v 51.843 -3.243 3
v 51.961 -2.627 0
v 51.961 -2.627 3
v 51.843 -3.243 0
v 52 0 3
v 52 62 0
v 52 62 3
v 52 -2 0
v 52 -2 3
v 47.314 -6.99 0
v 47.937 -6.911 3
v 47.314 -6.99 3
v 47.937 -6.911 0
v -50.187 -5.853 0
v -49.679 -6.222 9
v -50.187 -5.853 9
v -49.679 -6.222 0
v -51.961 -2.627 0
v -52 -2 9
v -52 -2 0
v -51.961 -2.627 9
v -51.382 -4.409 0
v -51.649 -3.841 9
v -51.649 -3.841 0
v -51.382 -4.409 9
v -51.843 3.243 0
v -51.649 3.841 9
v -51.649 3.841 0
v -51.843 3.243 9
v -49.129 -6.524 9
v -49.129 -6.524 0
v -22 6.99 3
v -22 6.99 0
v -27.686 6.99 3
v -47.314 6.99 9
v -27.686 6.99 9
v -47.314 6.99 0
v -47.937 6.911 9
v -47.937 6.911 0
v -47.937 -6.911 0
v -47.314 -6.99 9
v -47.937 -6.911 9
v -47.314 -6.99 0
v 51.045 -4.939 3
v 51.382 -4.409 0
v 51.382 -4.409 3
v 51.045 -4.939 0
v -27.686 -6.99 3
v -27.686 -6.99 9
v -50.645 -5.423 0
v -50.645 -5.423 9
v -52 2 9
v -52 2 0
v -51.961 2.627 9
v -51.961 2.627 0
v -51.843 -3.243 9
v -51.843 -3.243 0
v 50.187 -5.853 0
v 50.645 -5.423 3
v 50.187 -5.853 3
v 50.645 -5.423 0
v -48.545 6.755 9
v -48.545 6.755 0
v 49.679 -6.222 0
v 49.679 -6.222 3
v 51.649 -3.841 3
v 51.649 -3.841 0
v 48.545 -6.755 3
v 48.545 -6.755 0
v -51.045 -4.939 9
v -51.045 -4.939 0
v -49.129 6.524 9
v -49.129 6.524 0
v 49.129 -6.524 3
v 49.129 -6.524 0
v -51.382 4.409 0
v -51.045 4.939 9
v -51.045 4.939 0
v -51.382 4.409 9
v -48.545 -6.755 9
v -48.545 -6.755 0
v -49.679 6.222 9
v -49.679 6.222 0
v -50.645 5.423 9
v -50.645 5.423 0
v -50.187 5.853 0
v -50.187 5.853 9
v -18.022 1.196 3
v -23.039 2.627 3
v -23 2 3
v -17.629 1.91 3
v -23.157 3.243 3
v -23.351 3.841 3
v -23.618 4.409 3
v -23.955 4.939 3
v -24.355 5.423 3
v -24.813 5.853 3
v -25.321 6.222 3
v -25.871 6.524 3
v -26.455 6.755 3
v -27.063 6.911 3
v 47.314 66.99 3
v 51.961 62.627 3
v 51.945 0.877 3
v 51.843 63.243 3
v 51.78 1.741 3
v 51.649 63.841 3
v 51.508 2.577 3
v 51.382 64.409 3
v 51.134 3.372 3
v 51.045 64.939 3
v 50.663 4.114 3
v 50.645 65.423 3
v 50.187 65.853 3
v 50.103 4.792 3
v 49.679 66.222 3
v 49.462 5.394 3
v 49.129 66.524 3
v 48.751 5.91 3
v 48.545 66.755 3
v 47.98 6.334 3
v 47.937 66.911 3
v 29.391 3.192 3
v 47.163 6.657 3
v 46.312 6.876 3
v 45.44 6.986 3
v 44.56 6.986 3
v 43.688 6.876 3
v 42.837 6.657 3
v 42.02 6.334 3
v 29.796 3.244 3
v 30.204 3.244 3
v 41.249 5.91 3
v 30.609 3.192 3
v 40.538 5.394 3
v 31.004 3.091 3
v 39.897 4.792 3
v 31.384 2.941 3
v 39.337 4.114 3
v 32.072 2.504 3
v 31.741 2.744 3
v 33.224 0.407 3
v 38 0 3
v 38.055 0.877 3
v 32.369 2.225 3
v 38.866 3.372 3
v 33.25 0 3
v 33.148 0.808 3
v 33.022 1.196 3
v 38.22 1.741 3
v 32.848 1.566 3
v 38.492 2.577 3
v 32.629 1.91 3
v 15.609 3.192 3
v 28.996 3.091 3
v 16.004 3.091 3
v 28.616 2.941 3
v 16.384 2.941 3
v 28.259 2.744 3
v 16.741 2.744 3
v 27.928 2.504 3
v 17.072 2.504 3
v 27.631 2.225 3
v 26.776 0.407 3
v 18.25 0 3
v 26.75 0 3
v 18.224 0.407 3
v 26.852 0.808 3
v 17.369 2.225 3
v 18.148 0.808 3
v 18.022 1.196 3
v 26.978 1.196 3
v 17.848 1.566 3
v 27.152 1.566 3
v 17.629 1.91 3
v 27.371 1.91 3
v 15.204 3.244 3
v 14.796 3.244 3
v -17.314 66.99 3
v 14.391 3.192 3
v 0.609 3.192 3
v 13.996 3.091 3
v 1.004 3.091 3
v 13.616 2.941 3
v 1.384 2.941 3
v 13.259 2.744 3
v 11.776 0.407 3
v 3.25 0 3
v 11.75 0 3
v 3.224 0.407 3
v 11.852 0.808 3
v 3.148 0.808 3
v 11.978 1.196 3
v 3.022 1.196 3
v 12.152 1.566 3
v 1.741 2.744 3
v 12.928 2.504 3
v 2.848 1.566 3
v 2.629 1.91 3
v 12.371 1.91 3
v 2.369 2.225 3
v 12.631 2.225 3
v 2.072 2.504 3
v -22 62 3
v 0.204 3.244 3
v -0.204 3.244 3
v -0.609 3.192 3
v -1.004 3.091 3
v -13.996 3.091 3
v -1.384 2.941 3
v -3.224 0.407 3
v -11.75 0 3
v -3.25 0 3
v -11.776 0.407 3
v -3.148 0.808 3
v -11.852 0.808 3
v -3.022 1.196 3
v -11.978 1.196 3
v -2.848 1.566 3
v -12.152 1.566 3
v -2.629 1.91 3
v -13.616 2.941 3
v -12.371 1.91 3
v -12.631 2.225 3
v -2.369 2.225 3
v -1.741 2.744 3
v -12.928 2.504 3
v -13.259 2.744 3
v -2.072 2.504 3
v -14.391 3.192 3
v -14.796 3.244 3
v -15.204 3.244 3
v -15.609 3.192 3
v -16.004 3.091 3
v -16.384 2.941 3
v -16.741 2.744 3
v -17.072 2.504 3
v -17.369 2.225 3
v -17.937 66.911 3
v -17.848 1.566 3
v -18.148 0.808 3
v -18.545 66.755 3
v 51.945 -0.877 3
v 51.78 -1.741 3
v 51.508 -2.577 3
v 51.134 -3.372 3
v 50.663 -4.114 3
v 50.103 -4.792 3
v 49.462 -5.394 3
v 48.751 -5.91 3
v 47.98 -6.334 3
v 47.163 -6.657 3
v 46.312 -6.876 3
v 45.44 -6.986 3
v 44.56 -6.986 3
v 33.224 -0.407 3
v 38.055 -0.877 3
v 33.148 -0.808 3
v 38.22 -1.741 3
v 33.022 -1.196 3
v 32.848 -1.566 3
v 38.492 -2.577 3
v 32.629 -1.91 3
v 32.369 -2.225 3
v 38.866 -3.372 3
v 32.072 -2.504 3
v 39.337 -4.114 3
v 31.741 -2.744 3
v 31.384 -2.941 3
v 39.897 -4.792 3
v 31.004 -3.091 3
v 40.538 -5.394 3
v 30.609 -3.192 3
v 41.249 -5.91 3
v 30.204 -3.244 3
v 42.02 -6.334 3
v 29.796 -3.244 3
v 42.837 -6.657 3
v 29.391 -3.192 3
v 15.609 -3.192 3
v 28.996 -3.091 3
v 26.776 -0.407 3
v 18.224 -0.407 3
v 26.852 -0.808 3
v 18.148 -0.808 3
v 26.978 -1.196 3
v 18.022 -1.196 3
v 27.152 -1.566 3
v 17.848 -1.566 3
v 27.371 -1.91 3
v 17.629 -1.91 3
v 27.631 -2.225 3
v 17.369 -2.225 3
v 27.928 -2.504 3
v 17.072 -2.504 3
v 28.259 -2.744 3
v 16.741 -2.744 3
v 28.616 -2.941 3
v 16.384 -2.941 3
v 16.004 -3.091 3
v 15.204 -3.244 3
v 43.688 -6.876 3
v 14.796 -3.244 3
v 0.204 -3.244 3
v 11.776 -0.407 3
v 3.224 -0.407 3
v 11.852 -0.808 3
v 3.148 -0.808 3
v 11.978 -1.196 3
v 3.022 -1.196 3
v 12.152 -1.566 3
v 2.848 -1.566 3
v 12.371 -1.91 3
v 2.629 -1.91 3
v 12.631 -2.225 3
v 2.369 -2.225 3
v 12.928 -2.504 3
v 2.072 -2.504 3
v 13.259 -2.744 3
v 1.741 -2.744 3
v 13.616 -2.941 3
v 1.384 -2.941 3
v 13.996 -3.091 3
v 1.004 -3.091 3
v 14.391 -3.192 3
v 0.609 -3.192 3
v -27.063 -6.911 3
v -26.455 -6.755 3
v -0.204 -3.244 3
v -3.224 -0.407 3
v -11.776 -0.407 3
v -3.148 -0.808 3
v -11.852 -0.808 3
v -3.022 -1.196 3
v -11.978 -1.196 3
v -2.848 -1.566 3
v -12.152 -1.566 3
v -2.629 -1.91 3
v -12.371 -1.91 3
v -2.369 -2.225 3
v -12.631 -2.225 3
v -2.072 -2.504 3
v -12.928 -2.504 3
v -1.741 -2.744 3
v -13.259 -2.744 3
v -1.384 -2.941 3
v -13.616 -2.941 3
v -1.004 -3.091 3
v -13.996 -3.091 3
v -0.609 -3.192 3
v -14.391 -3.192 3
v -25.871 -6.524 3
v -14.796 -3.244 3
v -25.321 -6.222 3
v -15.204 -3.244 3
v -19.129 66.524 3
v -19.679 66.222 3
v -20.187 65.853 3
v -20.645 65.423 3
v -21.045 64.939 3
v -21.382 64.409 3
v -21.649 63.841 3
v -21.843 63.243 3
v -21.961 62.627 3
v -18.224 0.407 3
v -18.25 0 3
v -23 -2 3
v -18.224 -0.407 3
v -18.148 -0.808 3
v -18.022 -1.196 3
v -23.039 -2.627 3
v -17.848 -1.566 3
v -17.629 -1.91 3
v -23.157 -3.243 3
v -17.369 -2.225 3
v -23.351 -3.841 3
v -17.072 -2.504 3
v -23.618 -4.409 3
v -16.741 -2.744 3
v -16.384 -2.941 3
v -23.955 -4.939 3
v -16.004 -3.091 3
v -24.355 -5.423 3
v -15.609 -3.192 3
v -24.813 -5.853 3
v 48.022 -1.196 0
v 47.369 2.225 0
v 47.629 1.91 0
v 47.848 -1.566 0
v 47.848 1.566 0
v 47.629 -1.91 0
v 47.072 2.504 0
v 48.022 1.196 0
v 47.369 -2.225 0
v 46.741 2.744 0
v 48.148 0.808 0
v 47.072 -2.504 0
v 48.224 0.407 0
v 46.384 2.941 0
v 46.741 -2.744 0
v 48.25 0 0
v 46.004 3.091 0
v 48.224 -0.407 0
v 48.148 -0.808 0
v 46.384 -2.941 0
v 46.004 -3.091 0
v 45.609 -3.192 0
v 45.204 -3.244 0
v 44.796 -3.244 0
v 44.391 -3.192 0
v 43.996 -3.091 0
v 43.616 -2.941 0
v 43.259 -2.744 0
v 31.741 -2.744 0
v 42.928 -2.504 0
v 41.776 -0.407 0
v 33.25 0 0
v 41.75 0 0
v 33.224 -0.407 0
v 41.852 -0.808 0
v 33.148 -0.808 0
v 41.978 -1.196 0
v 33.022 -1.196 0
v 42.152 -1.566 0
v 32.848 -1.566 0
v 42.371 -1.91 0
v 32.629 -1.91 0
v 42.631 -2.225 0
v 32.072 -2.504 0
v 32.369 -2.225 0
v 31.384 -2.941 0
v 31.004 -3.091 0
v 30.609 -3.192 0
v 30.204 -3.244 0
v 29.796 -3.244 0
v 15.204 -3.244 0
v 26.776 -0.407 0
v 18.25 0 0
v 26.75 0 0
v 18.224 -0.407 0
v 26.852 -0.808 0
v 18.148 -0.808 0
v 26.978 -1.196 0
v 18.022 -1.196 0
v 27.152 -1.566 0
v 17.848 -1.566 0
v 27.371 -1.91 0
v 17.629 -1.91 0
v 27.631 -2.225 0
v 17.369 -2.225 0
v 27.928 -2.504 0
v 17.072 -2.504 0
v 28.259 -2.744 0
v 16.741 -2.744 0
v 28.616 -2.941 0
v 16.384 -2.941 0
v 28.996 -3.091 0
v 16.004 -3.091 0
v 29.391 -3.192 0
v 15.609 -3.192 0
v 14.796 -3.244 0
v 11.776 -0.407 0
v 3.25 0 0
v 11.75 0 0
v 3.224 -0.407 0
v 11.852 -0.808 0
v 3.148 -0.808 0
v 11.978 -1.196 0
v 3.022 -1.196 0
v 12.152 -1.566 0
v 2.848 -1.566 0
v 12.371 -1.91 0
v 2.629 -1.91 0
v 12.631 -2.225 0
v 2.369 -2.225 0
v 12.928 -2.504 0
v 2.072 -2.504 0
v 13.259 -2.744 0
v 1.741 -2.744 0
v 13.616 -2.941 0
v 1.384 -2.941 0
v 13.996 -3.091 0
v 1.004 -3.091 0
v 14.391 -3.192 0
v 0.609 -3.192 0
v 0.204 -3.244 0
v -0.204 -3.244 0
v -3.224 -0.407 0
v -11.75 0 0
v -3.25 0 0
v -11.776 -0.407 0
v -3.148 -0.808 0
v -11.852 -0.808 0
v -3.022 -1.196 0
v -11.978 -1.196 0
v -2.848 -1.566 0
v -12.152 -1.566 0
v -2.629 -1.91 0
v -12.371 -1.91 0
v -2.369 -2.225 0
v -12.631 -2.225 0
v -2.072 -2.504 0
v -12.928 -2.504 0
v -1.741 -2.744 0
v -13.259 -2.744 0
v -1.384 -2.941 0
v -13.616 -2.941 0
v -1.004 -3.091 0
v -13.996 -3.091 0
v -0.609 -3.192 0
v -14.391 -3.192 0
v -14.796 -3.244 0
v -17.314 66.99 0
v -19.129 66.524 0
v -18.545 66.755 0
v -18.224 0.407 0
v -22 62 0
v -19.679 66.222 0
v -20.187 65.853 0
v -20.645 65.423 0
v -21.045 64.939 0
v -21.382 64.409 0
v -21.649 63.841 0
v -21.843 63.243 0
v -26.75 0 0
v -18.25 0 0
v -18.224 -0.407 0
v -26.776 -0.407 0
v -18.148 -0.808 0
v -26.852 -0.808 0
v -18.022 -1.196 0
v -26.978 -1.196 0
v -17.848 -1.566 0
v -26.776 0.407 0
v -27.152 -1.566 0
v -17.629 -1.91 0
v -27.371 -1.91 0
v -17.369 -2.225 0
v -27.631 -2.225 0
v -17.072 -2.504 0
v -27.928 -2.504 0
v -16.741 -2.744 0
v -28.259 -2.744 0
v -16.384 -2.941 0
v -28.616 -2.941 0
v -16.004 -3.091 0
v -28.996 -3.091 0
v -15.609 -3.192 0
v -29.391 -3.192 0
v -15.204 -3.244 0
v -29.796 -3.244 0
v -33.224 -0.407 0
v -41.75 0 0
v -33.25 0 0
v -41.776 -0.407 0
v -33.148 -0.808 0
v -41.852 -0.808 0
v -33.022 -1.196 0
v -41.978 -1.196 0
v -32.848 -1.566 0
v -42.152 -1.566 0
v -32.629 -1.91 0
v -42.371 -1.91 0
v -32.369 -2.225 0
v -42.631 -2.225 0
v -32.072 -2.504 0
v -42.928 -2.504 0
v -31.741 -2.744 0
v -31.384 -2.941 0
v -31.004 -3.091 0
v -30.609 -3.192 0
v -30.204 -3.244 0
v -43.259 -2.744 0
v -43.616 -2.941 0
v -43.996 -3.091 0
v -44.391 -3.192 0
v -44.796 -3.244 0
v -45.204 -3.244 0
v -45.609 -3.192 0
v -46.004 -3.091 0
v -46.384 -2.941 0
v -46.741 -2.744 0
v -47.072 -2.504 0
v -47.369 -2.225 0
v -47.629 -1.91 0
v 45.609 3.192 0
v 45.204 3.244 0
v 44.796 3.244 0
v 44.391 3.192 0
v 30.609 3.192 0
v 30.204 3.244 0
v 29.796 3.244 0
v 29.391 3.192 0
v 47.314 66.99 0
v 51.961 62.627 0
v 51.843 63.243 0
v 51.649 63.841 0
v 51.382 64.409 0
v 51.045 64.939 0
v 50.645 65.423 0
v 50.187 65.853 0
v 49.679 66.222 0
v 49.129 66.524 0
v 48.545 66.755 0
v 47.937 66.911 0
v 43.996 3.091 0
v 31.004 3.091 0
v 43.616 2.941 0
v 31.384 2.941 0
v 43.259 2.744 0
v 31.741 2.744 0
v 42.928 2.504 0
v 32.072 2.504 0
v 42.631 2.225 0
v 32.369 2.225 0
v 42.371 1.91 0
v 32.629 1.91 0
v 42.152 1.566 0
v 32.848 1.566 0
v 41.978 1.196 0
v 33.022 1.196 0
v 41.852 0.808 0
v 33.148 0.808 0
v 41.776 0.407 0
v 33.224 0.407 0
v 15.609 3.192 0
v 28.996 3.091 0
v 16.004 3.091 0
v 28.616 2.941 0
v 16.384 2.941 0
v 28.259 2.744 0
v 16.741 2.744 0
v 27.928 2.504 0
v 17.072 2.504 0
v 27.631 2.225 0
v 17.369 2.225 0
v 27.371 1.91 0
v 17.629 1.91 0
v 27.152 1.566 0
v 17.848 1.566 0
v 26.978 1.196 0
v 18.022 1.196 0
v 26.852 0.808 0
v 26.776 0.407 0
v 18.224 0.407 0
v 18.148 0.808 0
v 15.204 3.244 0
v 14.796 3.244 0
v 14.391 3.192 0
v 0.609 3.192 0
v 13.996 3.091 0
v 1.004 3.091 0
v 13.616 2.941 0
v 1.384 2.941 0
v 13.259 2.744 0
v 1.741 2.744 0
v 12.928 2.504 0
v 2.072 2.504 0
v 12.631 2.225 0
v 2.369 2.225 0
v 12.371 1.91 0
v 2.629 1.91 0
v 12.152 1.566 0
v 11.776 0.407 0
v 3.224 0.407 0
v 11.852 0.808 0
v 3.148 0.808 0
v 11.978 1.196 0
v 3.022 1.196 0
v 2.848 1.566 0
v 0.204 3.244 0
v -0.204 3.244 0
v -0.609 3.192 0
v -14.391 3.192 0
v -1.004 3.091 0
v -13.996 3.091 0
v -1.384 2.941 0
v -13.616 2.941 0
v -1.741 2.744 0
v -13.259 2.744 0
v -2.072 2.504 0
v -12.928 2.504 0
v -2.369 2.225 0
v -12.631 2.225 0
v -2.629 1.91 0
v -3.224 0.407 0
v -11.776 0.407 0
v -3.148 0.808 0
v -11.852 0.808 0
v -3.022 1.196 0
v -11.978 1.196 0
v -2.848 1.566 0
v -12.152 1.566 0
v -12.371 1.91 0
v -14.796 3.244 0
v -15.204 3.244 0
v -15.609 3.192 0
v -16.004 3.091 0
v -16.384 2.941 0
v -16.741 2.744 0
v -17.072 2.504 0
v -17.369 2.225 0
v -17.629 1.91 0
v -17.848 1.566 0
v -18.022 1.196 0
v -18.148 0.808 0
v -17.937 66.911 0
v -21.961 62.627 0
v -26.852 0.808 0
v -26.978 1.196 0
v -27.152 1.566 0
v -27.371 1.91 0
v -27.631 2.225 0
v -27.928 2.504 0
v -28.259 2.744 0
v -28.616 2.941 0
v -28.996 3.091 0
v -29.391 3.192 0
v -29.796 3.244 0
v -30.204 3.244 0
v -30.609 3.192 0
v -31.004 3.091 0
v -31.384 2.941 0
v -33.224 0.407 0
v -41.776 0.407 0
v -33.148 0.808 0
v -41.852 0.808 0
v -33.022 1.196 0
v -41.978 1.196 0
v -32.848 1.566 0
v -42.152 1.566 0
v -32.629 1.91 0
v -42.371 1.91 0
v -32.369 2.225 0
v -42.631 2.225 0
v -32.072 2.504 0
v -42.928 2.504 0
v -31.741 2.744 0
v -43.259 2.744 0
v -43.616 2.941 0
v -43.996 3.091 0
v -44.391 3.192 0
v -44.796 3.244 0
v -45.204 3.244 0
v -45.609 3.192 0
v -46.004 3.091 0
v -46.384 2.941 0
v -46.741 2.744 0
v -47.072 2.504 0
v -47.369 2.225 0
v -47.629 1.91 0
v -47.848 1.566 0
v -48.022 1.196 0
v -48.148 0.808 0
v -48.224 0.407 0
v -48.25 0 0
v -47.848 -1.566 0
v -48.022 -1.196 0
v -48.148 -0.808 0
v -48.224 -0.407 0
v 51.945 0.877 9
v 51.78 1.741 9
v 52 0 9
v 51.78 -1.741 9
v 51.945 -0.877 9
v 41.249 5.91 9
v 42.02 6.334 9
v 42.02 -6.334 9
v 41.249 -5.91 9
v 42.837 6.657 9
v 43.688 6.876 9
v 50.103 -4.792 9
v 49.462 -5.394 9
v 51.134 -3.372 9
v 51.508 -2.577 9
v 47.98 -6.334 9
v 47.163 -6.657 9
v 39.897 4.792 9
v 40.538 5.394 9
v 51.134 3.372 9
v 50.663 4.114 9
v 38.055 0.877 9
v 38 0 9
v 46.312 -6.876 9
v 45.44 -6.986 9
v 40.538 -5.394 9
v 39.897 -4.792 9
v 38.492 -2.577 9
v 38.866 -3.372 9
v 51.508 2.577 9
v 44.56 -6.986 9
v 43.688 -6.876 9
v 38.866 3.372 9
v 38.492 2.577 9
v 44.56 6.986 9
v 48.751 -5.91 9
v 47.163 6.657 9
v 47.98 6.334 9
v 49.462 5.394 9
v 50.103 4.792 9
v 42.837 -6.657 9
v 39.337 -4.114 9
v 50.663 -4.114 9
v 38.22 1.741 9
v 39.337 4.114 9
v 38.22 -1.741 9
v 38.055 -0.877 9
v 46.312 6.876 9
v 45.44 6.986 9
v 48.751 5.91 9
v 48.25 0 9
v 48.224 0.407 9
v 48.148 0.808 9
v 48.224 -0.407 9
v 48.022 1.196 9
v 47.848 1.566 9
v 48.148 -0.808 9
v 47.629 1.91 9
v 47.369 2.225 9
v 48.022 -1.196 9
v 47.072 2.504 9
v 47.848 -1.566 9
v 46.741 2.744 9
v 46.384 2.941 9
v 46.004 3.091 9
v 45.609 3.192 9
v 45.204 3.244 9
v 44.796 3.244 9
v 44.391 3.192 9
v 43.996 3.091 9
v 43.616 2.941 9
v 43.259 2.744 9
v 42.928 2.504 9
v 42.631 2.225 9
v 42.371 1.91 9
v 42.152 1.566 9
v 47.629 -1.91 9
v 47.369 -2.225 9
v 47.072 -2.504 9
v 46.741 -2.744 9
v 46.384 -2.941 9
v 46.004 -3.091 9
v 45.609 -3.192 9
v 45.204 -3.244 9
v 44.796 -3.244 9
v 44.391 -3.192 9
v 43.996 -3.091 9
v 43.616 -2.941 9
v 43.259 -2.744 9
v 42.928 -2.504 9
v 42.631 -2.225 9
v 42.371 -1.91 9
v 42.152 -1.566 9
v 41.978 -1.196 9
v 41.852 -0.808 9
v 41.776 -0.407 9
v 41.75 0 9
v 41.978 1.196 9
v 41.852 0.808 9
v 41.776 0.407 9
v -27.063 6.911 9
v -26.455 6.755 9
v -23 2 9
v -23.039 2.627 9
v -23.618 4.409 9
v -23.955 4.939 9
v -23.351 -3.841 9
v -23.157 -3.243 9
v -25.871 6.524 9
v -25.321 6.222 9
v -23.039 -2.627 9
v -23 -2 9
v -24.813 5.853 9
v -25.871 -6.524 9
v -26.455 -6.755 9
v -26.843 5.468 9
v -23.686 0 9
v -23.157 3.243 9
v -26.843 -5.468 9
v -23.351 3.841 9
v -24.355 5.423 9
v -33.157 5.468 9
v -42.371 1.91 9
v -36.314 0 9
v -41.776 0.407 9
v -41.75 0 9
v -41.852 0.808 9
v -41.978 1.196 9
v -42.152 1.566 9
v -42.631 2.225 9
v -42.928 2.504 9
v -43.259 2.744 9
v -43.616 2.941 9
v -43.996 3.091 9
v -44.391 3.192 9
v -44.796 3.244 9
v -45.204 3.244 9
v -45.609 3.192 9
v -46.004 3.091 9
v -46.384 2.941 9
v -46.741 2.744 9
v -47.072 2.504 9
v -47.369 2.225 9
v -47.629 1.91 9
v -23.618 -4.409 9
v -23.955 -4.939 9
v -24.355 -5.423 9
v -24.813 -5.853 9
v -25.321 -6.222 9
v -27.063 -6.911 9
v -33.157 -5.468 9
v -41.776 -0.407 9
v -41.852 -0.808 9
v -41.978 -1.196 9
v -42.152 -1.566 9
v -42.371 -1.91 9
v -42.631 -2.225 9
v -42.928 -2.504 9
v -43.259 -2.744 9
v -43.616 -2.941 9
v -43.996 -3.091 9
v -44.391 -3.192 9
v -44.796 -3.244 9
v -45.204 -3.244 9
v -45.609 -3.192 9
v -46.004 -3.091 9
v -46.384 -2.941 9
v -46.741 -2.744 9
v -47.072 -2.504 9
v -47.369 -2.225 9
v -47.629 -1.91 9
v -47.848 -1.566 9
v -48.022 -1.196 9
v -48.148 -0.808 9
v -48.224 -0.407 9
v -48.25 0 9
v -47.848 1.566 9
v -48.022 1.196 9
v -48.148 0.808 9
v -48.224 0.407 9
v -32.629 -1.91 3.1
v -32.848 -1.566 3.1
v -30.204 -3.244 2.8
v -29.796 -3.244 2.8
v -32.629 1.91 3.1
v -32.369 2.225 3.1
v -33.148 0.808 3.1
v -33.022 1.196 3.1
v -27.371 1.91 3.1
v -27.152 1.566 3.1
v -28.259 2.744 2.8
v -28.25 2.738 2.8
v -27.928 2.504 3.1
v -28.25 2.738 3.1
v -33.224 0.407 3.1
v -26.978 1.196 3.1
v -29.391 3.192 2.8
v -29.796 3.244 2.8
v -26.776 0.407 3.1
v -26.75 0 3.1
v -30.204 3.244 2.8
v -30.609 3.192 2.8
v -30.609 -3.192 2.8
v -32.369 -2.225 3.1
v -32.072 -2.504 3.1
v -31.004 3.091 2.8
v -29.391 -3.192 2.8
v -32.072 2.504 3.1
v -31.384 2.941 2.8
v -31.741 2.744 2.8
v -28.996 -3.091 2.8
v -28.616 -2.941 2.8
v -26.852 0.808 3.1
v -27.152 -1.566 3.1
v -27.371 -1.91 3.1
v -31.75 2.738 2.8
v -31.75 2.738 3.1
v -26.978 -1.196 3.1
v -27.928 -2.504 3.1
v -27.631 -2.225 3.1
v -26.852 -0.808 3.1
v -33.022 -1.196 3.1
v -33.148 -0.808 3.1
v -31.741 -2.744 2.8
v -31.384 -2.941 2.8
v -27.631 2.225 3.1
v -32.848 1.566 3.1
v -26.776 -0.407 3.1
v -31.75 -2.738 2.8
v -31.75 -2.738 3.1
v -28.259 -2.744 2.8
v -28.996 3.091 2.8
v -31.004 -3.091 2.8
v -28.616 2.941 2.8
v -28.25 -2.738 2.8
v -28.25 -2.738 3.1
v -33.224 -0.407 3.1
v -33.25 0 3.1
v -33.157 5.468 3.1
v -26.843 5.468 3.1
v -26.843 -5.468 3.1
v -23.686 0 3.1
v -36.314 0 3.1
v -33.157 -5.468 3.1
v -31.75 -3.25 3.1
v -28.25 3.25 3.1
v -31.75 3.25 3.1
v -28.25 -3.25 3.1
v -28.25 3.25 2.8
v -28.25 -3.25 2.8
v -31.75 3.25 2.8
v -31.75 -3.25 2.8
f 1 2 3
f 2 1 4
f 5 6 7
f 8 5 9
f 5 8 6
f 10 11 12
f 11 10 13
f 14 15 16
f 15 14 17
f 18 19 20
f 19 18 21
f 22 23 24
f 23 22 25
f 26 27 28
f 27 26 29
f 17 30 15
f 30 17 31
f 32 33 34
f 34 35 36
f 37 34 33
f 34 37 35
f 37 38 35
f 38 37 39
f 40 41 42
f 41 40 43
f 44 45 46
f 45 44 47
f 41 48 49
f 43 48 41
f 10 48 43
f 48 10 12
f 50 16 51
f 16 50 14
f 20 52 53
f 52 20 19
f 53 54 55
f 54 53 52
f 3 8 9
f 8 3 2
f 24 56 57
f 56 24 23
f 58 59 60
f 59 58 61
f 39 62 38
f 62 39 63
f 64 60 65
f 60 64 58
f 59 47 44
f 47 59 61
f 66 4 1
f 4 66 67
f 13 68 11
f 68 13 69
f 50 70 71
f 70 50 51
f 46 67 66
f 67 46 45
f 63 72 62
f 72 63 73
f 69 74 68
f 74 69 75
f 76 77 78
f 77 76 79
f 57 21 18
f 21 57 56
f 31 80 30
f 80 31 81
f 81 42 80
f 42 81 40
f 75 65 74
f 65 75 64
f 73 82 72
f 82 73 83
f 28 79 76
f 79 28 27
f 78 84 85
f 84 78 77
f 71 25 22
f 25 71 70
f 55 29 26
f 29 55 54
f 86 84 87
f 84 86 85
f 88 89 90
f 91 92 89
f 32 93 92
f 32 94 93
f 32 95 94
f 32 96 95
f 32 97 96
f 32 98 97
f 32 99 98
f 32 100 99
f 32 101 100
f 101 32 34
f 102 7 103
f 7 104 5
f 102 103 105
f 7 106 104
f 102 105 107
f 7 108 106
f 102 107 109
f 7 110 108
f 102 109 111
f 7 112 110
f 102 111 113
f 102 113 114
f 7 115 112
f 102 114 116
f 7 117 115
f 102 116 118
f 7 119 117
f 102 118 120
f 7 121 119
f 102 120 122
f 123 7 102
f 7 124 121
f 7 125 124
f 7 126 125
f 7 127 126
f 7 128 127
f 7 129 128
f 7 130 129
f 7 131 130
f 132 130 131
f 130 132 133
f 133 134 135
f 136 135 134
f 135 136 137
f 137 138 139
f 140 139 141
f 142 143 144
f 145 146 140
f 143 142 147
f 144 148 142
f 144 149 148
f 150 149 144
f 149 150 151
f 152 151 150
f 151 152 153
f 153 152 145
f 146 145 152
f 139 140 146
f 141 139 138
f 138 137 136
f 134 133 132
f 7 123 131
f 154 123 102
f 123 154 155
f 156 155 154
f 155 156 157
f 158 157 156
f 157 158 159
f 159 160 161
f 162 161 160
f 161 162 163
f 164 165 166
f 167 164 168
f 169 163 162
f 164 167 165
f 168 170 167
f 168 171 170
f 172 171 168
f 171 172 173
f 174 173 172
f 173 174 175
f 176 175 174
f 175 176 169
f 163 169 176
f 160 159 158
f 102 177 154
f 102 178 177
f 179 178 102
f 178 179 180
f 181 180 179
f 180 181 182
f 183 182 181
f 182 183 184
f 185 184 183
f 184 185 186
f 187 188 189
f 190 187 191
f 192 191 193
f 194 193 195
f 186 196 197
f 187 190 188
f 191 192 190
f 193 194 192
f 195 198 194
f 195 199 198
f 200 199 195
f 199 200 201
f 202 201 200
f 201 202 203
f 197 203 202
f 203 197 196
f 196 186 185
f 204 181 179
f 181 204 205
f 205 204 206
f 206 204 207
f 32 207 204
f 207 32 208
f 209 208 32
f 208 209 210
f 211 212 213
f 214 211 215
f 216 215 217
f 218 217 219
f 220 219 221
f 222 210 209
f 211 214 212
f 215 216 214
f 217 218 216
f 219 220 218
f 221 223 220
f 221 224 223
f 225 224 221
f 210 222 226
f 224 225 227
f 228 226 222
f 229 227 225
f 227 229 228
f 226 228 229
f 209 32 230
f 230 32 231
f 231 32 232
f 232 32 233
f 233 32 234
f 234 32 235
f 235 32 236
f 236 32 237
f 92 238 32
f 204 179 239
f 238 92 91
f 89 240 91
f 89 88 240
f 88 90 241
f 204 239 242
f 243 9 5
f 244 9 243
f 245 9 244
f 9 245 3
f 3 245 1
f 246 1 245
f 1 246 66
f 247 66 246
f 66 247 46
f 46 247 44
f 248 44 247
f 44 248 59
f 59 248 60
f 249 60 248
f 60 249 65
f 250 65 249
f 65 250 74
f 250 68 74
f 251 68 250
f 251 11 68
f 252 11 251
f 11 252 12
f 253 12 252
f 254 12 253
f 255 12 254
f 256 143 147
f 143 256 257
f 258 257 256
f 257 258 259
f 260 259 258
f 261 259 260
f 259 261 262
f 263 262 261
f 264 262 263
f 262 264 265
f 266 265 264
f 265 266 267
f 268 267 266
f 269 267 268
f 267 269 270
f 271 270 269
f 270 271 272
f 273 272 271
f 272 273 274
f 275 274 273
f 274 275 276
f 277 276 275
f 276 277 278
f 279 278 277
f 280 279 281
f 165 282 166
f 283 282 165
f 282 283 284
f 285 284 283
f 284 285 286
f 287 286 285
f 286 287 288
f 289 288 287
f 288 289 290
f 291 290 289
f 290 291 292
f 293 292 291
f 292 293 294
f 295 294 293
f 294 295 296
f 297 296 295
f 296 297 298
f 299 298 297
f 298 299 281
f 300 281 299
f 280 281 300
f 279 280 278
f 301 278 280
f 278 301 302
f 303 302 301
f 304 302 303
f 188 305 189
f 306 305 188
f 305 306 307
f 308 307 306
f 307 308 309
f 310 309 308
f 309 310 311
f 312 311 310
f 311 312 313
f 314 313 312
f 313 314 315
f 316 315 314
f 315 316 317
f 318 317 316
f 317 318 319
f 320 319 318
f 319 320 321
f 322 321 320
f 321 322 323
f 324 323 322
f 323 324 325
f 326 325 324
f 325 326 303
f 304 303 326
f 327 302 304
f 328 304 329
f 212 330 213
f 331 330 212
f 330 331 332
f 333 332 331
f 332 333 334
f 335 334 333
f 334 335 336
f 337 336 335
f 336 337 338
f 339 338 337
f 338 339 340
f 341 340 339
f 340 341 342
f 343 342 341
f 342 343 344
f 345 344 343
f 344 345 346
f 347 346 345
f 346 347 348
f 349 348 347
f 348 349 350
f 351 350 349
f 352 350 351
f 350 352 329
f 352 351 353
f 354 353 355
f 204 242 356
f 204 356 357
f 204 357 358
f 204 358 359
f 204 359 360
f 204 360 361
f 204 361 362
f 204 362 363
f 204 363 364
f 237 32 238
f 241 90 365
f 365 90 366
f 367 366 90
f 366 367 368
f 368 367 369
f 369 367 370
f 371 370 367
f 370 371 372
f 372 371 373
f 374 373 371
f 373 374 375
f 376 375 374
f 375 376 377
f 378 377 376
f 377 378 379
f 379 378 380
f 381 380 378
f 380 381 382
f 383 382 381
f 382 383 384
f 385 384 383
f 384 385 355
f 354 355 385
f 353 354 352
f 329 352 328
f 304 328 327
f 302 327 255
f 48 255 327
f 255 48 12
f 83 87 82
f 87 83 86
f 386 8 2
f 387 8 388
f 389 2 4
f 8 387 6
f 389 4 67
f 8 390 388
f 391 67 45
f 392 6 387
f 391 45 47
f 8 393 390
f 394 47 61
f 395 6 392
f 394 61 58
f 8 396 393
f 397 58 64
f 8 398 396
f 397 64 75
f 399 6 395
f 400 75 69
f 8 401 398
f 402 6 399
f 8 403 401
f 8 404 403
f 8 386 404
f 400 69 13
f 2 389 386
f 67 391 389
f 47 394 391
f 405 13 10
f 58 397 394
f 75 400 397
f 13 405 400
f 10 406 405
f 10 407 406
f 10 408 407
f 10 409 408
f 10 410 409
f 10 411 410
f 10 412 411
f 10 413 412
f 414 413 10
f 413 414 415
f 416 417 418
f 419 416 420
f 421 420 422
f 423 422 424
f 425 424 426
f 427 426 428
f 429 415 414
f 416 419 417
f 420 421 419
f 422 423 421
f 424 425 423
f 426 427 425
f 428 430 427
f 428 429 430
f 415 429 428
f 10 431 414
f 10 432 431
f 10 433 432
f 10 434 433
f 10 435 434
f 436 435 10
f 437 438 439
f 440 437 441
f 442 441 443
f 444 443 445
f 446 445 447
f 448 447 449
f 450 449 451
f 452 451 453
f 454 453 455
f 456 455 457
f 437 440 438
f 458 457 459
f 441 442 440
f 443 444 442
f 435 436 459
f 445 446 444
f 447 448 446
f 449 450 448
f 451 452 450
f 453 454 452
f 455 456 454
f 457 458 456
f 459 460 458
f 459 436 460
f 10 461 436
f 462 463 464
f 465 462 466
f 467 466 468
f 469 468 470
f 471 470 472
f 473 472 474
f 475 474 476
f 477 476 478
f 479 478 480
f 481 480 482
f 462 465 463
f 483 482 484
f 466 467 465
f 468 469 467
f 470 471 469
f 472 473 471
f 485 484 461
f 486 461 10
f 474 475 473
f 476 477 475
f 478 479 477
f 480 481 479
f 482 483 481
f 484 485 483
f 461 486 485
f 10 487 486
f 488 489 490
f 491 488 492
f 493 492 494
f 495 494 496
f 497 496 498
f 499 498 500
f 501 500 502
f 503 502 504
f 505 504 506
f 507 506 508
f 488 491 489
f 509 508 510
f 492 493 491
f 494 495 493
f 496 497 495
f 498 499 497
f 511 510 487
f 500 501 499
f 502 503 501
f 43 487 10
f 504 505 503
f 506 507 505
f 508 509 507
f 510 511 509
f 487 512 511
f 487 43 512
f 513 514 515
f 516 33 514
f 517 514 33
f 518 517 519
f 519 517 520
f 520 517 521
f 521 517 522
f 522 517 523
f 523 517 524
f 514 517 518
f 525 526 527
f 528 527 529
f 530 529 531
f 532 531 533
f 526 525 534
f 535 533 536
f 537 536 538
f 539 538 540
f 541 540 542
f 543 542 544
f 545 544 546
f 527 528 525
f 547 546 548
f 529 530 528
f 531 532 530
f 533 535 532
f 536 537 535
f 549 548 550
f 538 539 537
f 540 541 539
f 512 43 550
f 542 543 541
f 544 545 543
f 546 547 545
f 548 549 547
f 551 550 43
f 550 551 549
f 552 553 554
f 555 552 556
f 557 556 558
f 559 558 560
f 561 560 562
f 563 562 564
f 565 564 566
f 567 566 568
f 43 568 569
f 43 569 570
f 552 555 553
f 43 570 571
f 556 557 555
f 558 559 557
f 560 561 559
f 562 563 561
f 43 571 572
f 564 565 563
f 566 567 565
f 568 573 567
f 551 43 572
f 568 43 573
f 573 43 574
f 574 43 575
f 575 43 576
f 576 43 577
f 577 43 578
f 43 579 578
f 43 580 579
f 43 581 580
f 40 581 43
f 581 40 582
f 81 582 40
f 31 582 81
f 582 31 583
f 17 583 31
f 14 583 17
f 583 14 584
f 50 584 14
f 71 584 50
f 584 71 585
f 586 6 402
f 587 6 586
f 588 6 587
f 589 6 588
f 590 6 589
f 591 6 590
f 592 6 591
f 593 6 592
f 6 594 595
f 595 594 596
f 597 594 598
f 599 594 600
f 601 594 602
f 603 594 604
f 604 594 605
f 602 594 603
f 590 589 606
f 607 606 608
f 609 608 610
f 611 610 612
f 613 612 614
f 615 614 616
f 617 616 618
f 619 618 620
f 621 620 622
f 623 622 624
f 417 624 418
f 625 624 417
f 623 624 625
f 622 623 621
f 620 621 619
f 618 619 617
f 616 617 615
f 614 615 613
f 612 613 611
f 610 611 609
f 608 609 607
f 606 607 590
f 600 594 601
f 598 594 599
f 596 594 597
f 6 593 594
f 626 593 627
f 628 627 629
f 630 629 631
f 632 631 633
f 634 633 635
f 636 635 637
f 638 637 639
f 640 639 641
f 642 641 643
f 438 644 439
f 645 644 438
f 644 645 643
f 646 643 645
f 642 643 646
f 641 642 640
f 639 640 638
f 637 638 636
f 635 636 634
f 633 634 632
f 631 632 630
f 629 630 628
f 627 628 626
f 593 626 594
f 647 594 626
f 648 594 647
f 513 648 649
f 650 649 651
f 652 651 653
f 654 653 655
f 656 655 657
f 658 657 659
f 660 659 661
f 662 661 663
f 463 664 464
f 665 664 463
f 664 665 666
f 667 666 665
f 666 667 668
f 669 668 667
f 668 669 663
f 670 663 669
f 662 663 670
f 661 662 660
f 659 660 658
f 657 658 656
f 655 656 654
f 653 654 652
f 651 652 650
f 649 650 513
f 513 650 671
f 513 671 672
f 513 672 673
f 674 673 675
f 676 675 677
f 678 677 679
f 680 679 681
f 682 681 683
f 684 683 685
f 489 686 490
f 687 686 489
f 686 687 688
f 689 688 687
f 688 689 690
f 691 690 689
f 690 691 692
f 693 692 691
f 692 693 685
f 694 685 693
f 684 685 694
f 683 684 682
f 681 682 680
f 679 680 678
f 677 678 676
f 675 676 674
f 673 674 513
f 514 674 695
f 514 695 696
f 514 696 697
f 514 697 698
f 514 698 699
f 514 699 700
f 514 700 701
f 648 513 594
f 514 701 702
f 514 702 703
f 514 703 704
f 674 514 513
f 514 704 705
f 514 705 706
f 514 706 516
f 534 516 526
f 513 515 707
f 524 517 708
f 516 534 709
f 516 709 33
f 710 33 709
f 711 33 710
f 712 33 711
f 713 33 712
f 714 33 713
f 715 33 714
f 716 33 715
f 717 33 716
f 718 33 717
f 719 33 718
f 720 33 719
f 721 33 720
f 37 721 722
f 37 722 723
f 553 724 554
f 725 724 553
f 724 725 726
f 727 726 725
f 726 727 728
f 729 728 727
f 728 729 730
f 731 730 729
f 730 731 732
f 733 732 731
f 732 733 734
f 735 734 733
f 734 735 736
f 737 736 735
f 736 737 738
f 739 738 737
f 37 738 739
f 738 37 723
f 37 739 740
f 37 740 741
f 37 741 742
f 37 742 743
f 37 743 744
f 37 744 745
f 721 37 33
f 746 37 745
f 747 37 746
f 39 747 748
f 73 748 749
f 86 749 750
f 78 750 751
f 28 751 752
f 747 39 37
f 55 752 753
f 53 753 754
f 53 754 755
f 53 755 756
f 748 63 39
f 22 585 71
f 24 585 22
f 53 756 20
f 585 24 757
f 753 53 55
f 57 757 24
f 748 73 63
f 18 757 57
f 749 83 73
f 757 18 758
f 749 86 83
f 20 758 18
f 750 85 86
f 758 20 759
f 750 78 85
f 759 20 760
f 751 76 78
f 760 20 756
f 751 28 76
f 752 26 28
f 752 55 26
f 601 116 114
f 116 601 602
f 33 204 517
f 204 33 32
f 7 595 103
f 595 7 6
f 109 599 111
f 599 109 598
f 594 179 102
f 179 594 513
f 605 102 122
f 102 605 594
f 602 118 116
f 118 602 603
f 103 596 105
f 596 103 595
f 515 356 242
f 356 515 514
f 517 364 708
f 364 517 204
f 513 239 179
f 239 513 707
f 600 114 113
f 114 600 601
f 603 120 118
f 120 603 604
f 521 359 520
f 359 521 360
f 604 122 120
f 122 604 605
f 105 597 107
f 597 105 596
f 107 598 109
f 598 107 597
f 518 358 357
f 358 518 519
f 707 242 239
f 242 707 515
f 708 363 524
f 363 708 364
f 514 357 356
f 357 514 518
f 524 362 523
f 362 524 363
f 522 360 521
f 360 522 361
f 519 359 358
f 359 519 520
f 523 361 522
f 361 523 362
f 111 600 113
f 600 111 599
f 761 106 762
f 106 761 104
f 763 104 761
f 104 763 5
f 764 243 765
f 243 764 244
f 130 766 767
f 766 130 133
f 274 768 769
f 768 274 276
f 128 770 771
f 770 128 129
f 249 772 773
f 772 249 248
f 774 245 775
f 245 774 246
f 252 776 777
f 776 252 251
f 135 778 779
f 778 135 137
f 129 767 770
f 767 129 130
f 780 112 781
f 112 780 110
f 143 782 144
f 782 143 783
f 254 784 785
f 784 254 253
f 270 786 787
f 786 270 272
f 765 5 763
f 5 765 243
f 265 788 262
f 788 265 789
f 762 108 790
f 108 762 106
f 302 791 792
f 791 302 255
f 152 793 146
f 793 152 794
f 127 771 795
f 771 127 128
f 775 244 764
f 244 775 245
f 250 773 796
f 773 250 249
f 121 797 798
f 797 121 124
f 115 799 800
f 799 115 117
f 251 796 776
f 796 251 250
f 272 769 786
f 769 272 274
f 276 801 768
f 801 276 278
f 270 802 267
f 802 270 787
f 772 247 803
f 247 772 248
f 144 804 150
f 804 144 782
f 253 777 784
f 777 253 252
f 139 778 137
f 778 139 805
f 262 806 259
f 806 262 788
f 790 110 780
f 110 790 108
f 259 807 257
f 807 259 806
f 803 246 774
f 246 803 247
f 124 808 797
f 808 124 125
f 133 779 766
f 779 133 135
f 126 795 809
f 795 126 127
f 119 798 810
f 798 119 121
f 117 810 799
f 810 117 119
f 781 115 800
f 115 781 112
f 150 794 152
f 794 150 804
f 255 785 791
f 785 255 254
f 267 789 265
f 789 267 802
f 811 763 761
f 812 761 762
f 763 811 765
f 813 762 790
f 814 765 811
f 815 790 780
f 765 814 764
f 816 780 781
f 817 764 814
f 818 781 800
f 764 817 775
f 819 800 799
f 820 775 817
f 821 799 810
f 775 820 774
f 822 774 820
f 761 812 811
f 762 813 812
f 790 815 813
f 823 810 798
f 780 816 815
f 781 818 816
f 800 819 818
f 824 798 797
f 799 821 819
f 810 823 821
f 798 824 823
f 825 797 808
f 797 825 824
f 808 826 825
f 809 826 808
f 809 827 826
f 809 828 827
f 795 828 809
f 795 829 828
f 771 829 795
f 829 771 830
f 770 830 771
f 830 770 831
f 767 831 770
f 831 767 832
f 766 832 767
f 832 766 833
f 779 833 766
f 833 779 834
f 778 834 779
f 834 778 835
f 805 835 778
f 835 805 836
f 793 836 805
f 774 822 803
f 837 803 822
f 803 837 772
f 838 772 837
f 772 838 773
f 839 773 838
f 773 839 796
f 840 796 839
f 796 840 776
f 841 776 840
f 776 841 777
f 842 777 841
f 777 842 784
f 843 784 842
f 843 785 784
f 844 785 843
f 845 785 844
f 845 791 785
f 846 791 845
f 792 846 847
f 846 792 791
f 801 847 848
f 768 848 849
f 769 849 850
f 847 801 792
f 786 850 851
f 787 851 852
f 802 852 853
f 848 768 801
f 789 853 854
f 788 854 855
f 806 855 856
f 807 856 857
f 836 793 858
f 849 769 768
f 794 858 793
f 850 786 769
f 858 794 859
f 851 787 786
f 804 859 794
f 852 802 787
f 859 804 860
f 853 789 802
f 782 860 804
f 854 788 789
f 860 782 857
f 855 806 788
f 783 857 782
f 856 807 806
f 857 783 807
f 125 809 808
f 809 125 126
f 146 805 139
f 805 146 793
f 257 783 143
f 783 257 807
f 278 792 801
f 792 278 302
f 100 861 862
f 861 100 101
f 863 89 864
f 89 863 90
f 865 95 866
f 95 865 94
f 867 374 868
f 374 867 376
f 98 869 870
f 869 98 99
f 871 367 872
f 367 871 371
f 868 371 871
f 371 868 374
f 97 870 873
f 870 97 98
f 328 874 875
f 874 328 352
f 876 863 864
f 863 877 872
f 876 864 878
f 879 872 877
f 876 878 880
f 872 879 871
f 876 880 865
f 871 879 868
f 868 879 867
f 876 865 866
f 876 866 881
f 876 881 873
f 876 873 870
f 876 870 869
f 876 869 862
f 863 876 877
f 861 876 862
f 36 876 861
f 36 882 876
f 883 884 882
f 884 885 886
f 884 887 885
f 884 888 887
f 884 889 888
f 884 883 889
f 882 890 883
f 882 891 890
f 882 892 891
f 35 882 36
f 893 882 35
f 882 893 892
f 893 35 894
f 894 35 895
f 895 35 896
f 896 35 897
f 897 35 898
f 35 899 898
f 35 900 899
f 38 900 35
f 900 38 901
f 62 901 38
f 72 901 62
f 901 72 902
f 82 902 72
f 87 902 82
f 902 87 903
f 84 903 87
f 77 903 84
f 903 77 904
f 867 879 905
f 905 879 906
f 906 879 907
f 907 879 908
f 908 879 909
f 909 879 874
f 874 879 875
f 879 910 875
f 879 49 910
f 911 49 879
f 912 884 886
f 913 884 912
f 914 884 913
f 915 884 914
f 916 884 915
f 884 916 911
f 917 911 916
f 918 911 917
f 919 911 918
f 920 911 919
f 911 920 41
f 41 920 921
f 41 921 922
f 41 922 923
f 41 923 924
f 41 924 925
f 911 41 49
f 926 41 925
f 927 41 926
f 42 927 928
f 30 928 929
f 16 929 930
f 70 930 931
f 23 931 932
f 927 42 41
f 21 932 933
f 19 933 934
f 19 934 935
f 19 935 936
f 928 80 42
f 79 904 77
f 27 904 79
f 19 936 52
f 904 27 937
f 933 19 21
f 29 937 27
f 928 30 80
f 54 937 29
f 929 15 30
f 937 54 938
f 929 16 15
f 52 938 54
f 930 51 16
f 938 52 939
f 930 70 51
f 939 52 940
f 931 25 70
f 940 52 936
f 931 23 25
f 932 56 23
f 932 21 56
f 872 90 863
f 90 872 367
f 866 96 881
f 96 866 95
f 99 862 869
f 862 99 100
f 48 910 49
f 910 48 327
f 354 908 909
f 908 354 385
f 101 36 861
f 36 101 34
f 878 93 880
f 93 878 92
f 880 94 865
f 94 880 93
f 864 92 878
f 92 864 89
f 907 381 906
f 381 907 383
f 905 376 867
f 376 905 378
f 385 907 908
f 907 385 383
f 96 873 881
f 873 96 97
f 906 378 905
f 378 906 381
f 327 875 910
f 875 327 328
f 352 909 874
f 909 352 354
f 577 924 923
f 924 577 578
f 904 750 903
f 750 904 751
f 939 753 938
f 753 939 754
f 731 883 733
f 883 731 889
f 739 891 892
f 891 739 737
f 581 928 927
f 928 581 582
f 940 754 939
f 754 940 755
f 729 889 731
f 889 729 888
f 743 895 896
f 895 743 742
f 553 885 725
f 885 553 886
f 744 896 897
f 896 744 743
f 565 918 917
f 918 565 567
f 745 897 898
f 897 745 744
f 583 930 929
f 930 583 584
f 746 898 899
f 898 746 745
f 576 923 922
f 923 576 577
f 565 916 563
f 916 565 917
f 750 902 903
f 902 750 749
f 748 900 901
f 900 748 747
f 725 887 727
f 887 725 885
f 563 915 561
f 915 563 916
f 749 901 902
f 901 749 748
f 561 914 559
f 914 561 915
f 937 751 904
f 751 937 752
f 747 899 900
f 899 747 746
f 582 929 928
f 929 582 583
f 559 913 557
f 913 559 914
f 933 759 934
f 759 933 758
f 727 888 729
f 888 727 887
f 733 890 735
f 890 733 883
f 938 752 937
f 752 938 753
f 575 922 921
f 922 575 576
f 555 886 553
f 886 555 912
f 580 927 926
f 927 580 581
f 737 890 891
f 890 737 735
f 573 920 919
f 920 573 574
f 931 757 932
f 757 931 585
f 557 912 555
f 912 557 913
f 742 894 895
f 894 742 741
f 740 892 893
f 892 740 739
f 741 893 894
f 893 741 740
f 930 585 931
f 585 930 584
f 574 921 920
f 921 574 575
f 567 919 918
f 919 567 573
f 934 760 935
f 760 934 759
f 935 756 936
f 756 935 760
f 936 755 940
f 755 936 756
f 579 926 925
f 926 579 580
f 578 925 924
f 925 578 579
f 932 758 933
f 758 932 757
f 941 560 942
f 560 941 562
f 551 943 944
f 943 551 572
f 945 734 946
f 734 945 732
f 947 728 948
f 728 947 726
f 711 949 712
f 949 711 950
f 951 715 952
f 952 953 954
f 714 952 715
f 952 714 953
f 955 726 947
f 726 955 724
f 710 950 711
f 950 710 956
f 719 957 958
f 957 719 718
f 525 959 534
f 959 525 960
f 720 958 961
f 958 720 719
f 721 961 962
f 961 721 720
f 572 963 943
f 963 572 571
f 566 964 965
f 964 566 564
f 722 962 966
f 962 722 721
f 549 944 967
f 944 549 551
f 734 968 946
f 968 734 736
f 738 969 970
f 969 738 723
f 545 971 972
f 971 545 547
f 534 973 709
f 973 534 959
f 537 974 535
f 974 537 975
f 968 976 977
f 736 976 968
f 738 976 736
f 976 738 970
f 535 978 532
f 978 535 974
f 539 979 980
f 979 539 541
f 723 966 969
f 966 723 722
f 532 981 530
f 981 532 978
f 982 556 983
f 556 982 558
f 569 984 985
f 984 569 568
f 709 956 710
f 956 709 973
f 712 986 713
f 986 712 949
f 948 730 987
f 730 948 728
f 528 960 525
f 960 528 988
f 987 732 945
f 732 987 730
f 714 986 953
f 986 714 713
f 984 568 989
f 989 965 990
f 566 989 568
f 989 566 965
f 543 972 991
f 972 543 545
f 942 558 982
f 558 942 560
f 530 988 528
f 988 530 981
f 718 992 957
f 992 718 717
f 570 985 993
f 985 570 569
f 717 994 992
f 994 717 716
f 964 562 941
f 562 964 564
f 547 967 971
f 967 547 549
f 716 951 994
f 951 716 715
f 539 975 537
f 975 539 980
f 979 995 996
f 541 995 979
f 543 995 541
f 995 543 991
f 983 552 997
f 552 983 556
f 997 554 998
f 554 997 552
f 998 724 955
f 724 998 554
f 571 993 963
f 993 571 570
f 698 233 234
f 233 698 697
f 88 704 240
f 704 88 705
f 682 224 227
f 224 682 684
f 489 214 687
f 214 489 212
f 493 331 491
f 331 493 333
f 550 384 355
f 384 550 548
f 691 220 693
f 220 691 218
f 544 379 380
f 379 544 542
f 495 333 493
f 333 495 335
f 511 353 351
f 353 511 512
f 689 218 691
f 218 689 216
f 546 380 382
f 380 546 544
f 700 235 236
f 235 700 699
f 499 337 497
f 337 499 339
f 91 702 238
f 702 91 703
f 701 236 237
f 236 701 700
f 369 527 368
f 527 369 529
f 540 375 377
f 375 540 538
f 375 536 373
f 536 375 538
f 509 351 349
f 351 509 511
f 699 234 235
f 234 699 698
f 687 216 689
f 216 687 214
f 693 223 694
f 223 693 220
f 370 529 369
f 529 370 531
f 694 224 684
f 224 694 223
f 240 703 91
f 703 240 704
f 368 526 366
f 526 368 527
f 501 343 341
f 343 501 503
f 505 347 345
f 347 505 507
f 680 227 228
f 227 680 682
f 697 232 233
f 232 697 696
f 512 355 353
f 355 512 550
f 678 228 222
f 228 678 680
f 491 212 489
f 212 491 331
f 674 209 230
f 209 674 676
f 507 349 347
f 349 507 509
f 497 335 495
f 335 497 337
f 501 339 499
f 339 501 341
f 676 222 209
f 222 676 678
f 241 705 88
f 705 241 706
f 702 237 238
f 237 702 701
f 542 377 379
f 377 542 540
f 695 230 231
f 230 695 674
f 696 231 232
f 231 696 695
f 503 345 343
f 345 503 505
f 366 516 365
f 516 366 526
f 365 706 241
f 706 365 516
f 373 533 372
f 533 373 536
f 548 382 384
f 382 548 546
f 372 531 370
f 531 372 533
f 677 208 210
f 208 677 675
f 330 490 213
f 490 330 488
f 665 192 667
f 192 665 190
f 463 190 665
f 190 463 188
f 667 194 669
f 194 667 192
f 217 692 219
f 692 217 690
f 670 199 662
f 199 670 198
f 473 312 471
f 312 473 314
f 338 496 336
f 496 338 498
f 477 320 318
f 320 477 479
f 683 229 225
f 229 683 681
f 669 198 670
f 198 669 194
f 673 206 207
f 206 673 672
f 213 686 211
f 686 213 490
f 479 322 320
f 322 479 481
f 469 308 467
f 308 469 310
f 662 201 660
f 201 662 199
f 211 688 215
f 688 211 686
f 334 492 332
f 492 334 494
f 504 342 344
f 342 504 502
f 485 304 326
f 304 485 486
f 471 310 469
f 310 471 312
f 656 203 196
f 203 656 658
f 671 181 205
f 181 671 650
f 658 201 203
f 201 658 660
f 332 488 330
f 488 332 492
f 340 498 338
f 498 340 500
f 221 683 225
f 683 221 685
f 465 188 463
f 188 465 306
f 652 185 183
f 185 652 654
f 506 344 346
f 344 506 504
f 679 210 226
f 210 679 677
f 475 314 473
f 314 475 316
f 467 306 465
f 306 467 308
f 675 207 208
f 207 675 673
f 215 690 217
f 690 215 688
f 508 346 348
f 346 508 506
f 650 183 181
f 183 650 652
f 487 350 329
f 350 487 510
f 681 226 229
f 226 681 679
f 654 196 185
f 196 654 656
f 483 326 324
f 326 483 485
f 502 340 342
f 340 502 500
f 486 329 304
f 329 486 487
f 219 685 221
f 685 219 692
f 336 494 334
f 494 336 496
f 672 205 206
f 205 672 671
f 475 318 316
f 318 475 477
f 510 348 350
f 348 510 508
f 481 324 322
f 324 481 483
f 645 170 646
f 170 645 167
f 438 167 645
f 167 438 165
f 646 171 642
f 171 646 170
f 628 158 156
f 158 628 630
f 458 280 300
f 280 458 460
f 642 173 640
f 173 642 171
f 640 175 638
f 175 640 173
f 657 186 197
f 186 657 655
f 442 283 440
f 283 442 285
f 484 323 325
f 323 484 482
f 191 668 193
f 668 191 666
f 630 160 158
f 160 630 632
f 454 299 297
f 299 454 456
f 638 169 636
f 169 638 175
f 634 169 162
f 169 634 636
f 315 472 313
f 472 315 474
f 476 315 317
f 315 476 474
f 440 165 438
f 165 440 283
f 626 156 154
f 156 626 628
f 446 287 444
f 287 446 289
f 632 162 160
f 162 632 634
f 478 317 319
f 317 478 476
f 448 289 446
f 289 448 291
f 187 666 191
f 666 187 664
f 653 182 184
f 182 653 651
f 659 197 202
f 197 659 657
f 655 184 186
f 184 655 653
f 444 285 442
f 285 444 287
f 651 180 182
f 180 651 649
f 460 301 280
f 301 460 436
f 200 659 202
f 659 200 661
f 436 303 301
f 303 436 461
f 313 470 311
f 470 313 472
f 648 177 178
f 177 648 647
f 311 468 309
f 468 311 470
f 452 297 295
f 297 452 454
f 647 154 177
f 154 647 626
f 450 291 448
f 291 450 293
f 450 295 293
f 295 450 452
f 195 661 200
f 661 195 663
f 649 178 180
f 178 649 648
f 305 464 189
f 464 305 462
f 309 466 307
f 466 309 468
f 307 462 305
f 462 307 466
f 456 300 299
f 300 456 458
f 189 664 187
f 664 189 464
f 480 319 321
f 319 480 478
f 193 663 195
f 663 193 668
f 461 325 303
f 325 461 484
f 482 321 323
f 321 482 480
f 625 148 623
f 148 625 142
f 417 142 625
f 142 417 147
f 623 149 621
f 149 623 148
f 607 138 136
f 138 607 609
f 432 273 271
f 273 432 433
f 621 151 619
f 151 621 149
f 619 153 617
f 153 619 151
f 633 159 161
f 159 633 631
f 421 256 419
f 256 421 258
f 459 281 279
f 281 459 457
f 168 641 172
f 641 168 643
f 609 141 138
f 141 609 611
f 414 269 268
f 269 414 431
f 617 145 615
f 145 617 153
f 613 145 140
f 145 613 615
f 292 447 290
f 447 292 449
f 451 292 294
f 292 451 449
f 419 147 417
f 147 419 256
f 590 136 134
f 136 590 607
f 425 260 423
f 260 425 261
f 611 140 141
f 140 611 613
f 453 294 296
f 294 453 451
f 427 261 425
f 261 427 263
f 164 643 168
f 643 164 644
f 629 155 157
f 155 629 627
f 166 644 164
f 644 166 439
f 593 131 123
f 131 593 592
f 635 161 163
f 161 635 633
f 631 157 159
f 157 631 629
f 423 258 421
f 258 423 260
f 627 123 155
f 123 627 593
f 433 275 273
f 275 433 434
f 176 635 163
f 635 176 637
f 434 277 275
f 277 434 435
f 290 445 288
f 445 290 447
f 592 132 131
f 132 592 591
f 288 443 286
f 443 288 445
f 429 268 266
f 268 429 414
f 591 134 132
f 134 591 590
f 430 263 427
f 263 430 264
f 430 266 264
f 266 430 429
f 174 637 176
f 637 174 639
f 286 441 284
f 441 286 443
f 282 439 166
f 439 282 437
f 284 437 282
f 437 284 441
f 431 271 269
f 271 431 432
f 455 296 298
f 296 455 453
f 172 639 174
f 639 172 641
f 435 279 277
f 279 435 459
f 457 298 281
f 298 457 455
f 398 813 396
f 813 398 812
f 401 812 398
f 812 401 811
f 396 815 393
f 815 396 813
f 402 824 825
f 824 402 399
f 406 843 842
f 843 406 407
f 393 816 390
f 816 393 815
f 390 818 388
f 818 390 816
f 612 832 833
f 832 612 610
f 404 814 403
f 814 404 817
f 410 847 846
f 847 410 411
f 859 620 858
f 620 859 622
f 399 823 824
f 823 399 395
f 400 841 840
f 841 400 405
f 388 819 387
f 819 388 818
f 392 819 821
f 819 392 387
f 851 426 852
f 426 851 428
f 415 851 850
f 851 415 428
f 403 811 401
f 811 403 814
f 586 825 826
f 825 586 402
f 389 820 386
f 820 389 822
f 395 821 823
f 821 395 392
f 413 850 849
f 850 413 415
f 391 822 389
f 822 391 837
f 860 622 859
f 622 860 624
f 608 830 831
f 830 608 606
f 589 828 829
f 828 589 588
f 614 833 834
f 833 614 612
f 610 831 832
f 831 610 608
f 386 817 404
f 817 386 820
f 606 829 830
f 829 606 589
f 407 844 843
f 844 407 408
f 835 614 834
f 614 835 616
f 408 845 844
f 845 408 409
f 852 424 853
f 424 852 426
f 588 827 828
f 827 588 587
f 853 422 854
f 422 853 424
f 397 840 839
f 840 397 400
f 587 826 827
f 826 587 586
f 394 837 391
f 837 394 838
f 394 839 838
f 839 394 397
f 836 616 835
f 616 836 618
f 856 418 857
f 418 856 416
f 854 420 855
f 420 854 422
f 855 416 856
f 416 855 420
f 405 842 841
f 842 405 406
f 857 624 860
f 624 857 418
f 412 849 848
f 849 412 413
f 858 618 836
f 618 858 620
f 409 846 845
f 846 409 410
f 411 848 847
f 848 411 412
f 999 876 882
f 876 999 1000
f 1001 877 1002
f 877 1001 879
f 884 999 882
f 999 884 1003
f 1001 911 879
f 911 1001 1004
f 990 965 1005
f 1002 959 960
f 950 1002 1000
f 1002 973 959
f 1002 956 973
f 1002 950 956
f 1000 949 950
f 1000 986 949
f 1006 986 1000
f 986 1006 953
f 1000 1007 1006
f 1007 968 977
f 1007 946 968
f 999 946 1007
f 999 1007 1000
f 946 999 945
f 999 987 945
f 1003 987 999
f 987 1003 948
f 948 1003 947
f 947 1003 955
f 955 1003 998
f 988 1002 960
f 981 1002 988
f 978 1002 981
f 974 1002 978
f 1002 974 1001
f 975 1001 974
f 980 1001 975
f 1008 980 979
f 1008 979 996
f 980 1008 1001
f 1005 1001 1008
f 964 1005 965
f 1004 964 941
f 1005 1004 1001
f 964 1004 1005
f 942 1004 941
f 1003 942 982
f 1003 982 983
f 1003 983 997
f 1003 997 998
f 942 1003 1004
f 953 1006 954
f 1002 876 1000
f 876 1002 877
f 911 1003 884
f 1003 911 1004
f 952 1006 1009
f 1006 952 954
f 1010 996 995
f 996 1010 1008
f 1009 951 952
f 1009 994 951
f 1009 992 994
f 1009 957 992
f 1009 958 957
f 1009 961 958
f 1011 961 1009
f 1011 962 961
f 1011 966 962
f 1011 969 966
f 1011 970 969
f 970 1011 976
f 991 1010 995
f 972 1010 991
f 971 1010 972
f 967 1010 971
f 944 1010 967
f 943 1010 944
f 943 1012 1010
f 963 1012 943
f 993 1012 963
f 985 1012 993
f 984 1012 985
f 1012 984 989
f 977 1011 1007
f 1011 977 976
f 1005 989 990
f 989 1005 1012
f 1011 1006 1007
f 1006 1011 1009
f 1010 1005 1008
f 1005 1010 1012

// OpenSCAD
$fn = 50;


difference() {
	union() {
		translate(v = [0, 0, 0]) {
			rotate(a = [0, 0, 0]) {
				hull() {
					translate(v = [-47.0000000000, 2.0000000000, 0]) {
						rotate(a = [0, 0, 0]) {
							translate(v = [0, 0, 0]) {
								rotate(a = [0, 0, 0]) {
									cylinder(h = 3, r = 5);
								}
							}
						}
					}
					translate(v = [47.0000000000, 2.0000000000, 0]) {
						rotate(a = [0, 0, 0]) {
							translate(v = [0, 0, 0]) {
								rotate(a = [0, 0, 0]) {
									cylinder(h = 3, r = 5);
								}
							}
						}
					}
					translate(v = [-47.0000000000, -2.0000000000, 0]) {
						rotate(a = [0, 0, 0]) {
							translate(v = [0, 0, 0]) {
								rotate(a = [0, 0, 0]) {
									cylinder(h = 3, r = 5);
								}
							}
						}
					}
					translate(v = [47.0000000000, -2.0000000000, 0]) {
						rotate(a = [0, 0, 0]) {
							translate(v = [0, 0, 0]) {
								rotate(a = [0, 0, 0]) {
									cylinder(h = 3, r = 5);
								}
							}
						}
					}
				}
			}
		}
		translate(v = [15, 30, 0]) {
			rotate(a = [0, 0, 0]) {
				hull() {
					translate(v = [-32.0000000000, 32.0000000000, 0]) {
						rotate(a = [0, 0, 0]) {
							translate(v = [0, 0, 0]) {
								rotate(a = [0, 0, 0]) {
									cylinder(h = 3, r = 5);
								}
							}
						}
					}
					translate(v = [32.0000000000, 32.0000000000, 0]) {
						rotate(a = [0, 0, 0]) {
							translate(v = [0, 0, 0]) {
								rotate(a = [0, 0, 0]) {
									cylinder(h = 3, r = 5);
								}
							}
						}
					}
					translate(v = [-32.0000000000, -32.0000000000, 0]) {
						rotate(a = [0, 0, 0]) {
							translate(v = [0, 0, 0]) {
								rotate(a = [0, 0, 0]) {
									cylinder(h = 3, r = 5);
								}
							}
						}
					}
					translate(v = [32.0000000000, -32.0000000000, 0]) {
						rotate(a = [0, 0, 0]) {
							translate(v = [0, 0, 0]) {
								rotate(a = [0, 0, 0]) {
									cylinder(h = 3, r = 5);
								}
							}
						}
					}
				}
			}
		}
		translate(v = [45.0000000000, 0, 0]) {
			rotate(a = [0, 0, 0]) {
				cylinder(h = 9, r = 7.0000000000);
			}
		}
		translate(v = [-37.5000000000, 0, 0]) {
			rotate(a = [0, 0, 0]) {
				hull() {
					translate(v = [-9.5000000000, 2.0000000000, 0]) {
						rotate(a = [0, 0, 0]) {
							translate(v = [0, 0, 0]) {
								rotate(a = [0, 0, 0]) {
									cylinder(h = 9, r = 5);
								}
							}
						}
					}
					translate(v = [9.5000000000, 2.0000000000, 0]) {
						rotate(a = [0, 0, 0]) {
							translate(v = [0, 0, 0]) {
								rotate(a = [0, 0, 0]) {
									cylinder(h = 9, r = 5);
								}
							}
						}
					}
					translate(v = [-9.5000000000, -2.0000000000, 0]) {
						rotate(a = [0, 0, 0]) {
							translate(v = [0, 0, 0]) {
								rotate(a = [0, 0, 0]) {
									cylinder(h = 9, r = 5);
								}
							}
						}
					}
					translate(v = [9.5000000000, -2.0000000000, 0]) {
						rotate(a = [0, 0, 0]) {
							translate(v = [0, 0, 0]) {
								rotate(a = [0, 0, 0]) {
									cylinder(h = 9, r = 5);
								}
							}
						}
					}
				}
			}
		}
	}
	union() {
		translate(v = [-45.0000000000, 0.0000000000, 0]) {
			rotate(a = [0, 0, 0]) {
				translate(v = [0, 0, -50]) {
					rotate(a = [0, 0, 0]) {
						cylinder(h = 100, r = 3.2500000000);
					}
				}
			}
		}
		translate(v = [-30.0000000000, 0.0000000000, 0]) {
			rotate(a = [0, 0, 0]) {
				translate(v = [0, 0, -50]) {
					rotate(a = [0, 0, 0]) {
						cylinder(h = 100, r = 3.2500000000);
					}
				}
			}
		}
		translate(v = [-15.0000000000, 0.0000000000, 0]) {
			rotate(a = [0, 0, 0]) {
				translate(v = [0, 0, -50]) {
					rotate(a = [0, 0, 0]) {
						cylinder(h = 100, r = 3.2500000000);
					}
				}
			}
		}
		translate(v = [0.0000000000, 0.0000000000, 0]) {
			rotate(a = [0, 0, 0]) {
				translate(v = [0, 0, -50]) {
					rotate(a = [0, 0, 0]) {
						cylinder(h = 100, r = 3.2500000000);
					}
				}
			}
		}
		translate(v = [15.0000000000, 0.0000000000, 0]) {
			rotate(a = [0, 0, 0]) {
				translate(v = [0, 0, -50]) {
					rotate(a = [0, 0, 0]) {
						cylinder(h = 100, r = 3.2500000000);
					}
				}
			}
		}
		translate(v = [30.0000000000, 0.0000000000, 0]) {
			rotate(a = [0, 0, 0]) {
				translate(v = [0, 0, -50]) {
					rotate(a = [0, 0, 0]) {
						cylinder(h = 100, r = 3.2500000000);
					}
				}
			}
		}
		translate(v = [45.0000000000, 0.0000000000, 0]) {
			rotate(a = [0, 0, 0]) {
				translate(v = [0, 0, -50]) {
					rotate(a = [0, 0, 0]) {
						cylinder(h = 100, r = 3.2500000000);
					}
				}
			}
		}
		translate(v = [-30.0000000000, 0, 3.1000000000]) {
			rotate(a = [0, 0, 0]) {
				translate(v = [0, 0, 0]) {
					rotate(a = [0, 0, 0]) {
						linear_extrude(height = 5.9000000000) {
							polygon(points = [[6.3142500000, 0.0000000000], [3.1571250000, 5.4683009058], [-3.1571250000, 5.4683009058], [-6.3142500000, 0.0000000000], [-3.1571250000, -5.4683009058], [3.1571250000, -5.4683009058]]);
						}
					}
				}
			}
		}
		translate(v = [-31.7500000000, -3.2500000000, 9.0000000000]) {
			rotate(a = [0, 0, 0]) {
				cube(size = [3.5000000000, 6.5000000000, 0.3000000000]);
			}
		}
		translate(v = [-31.7500000000, -1.7500000000, 9.3000000000]) {
			rotate(a = [0, 0, 0]) {
				cube(size = [3.5000000000, 3.5000000000, 0.3000000000]);
			}
		}
		translate(v = [-31.7500000000, -3.2500000000, 2.8000000000]) {
			rotate(a = [0, 0, 0]) {
				cube(size = [3.5000000000, 6.5000000000, 0.3000000000]);
			}
		}
		translate(v = [-31.7500000000, -1.7500000000, 2.5000000000]) {
			rotate(a = [0, 0, 0]) {
				cube(size = [3.5000000000, 3.5000000000, 0.3000000000]);
			}
		}
	}
}
